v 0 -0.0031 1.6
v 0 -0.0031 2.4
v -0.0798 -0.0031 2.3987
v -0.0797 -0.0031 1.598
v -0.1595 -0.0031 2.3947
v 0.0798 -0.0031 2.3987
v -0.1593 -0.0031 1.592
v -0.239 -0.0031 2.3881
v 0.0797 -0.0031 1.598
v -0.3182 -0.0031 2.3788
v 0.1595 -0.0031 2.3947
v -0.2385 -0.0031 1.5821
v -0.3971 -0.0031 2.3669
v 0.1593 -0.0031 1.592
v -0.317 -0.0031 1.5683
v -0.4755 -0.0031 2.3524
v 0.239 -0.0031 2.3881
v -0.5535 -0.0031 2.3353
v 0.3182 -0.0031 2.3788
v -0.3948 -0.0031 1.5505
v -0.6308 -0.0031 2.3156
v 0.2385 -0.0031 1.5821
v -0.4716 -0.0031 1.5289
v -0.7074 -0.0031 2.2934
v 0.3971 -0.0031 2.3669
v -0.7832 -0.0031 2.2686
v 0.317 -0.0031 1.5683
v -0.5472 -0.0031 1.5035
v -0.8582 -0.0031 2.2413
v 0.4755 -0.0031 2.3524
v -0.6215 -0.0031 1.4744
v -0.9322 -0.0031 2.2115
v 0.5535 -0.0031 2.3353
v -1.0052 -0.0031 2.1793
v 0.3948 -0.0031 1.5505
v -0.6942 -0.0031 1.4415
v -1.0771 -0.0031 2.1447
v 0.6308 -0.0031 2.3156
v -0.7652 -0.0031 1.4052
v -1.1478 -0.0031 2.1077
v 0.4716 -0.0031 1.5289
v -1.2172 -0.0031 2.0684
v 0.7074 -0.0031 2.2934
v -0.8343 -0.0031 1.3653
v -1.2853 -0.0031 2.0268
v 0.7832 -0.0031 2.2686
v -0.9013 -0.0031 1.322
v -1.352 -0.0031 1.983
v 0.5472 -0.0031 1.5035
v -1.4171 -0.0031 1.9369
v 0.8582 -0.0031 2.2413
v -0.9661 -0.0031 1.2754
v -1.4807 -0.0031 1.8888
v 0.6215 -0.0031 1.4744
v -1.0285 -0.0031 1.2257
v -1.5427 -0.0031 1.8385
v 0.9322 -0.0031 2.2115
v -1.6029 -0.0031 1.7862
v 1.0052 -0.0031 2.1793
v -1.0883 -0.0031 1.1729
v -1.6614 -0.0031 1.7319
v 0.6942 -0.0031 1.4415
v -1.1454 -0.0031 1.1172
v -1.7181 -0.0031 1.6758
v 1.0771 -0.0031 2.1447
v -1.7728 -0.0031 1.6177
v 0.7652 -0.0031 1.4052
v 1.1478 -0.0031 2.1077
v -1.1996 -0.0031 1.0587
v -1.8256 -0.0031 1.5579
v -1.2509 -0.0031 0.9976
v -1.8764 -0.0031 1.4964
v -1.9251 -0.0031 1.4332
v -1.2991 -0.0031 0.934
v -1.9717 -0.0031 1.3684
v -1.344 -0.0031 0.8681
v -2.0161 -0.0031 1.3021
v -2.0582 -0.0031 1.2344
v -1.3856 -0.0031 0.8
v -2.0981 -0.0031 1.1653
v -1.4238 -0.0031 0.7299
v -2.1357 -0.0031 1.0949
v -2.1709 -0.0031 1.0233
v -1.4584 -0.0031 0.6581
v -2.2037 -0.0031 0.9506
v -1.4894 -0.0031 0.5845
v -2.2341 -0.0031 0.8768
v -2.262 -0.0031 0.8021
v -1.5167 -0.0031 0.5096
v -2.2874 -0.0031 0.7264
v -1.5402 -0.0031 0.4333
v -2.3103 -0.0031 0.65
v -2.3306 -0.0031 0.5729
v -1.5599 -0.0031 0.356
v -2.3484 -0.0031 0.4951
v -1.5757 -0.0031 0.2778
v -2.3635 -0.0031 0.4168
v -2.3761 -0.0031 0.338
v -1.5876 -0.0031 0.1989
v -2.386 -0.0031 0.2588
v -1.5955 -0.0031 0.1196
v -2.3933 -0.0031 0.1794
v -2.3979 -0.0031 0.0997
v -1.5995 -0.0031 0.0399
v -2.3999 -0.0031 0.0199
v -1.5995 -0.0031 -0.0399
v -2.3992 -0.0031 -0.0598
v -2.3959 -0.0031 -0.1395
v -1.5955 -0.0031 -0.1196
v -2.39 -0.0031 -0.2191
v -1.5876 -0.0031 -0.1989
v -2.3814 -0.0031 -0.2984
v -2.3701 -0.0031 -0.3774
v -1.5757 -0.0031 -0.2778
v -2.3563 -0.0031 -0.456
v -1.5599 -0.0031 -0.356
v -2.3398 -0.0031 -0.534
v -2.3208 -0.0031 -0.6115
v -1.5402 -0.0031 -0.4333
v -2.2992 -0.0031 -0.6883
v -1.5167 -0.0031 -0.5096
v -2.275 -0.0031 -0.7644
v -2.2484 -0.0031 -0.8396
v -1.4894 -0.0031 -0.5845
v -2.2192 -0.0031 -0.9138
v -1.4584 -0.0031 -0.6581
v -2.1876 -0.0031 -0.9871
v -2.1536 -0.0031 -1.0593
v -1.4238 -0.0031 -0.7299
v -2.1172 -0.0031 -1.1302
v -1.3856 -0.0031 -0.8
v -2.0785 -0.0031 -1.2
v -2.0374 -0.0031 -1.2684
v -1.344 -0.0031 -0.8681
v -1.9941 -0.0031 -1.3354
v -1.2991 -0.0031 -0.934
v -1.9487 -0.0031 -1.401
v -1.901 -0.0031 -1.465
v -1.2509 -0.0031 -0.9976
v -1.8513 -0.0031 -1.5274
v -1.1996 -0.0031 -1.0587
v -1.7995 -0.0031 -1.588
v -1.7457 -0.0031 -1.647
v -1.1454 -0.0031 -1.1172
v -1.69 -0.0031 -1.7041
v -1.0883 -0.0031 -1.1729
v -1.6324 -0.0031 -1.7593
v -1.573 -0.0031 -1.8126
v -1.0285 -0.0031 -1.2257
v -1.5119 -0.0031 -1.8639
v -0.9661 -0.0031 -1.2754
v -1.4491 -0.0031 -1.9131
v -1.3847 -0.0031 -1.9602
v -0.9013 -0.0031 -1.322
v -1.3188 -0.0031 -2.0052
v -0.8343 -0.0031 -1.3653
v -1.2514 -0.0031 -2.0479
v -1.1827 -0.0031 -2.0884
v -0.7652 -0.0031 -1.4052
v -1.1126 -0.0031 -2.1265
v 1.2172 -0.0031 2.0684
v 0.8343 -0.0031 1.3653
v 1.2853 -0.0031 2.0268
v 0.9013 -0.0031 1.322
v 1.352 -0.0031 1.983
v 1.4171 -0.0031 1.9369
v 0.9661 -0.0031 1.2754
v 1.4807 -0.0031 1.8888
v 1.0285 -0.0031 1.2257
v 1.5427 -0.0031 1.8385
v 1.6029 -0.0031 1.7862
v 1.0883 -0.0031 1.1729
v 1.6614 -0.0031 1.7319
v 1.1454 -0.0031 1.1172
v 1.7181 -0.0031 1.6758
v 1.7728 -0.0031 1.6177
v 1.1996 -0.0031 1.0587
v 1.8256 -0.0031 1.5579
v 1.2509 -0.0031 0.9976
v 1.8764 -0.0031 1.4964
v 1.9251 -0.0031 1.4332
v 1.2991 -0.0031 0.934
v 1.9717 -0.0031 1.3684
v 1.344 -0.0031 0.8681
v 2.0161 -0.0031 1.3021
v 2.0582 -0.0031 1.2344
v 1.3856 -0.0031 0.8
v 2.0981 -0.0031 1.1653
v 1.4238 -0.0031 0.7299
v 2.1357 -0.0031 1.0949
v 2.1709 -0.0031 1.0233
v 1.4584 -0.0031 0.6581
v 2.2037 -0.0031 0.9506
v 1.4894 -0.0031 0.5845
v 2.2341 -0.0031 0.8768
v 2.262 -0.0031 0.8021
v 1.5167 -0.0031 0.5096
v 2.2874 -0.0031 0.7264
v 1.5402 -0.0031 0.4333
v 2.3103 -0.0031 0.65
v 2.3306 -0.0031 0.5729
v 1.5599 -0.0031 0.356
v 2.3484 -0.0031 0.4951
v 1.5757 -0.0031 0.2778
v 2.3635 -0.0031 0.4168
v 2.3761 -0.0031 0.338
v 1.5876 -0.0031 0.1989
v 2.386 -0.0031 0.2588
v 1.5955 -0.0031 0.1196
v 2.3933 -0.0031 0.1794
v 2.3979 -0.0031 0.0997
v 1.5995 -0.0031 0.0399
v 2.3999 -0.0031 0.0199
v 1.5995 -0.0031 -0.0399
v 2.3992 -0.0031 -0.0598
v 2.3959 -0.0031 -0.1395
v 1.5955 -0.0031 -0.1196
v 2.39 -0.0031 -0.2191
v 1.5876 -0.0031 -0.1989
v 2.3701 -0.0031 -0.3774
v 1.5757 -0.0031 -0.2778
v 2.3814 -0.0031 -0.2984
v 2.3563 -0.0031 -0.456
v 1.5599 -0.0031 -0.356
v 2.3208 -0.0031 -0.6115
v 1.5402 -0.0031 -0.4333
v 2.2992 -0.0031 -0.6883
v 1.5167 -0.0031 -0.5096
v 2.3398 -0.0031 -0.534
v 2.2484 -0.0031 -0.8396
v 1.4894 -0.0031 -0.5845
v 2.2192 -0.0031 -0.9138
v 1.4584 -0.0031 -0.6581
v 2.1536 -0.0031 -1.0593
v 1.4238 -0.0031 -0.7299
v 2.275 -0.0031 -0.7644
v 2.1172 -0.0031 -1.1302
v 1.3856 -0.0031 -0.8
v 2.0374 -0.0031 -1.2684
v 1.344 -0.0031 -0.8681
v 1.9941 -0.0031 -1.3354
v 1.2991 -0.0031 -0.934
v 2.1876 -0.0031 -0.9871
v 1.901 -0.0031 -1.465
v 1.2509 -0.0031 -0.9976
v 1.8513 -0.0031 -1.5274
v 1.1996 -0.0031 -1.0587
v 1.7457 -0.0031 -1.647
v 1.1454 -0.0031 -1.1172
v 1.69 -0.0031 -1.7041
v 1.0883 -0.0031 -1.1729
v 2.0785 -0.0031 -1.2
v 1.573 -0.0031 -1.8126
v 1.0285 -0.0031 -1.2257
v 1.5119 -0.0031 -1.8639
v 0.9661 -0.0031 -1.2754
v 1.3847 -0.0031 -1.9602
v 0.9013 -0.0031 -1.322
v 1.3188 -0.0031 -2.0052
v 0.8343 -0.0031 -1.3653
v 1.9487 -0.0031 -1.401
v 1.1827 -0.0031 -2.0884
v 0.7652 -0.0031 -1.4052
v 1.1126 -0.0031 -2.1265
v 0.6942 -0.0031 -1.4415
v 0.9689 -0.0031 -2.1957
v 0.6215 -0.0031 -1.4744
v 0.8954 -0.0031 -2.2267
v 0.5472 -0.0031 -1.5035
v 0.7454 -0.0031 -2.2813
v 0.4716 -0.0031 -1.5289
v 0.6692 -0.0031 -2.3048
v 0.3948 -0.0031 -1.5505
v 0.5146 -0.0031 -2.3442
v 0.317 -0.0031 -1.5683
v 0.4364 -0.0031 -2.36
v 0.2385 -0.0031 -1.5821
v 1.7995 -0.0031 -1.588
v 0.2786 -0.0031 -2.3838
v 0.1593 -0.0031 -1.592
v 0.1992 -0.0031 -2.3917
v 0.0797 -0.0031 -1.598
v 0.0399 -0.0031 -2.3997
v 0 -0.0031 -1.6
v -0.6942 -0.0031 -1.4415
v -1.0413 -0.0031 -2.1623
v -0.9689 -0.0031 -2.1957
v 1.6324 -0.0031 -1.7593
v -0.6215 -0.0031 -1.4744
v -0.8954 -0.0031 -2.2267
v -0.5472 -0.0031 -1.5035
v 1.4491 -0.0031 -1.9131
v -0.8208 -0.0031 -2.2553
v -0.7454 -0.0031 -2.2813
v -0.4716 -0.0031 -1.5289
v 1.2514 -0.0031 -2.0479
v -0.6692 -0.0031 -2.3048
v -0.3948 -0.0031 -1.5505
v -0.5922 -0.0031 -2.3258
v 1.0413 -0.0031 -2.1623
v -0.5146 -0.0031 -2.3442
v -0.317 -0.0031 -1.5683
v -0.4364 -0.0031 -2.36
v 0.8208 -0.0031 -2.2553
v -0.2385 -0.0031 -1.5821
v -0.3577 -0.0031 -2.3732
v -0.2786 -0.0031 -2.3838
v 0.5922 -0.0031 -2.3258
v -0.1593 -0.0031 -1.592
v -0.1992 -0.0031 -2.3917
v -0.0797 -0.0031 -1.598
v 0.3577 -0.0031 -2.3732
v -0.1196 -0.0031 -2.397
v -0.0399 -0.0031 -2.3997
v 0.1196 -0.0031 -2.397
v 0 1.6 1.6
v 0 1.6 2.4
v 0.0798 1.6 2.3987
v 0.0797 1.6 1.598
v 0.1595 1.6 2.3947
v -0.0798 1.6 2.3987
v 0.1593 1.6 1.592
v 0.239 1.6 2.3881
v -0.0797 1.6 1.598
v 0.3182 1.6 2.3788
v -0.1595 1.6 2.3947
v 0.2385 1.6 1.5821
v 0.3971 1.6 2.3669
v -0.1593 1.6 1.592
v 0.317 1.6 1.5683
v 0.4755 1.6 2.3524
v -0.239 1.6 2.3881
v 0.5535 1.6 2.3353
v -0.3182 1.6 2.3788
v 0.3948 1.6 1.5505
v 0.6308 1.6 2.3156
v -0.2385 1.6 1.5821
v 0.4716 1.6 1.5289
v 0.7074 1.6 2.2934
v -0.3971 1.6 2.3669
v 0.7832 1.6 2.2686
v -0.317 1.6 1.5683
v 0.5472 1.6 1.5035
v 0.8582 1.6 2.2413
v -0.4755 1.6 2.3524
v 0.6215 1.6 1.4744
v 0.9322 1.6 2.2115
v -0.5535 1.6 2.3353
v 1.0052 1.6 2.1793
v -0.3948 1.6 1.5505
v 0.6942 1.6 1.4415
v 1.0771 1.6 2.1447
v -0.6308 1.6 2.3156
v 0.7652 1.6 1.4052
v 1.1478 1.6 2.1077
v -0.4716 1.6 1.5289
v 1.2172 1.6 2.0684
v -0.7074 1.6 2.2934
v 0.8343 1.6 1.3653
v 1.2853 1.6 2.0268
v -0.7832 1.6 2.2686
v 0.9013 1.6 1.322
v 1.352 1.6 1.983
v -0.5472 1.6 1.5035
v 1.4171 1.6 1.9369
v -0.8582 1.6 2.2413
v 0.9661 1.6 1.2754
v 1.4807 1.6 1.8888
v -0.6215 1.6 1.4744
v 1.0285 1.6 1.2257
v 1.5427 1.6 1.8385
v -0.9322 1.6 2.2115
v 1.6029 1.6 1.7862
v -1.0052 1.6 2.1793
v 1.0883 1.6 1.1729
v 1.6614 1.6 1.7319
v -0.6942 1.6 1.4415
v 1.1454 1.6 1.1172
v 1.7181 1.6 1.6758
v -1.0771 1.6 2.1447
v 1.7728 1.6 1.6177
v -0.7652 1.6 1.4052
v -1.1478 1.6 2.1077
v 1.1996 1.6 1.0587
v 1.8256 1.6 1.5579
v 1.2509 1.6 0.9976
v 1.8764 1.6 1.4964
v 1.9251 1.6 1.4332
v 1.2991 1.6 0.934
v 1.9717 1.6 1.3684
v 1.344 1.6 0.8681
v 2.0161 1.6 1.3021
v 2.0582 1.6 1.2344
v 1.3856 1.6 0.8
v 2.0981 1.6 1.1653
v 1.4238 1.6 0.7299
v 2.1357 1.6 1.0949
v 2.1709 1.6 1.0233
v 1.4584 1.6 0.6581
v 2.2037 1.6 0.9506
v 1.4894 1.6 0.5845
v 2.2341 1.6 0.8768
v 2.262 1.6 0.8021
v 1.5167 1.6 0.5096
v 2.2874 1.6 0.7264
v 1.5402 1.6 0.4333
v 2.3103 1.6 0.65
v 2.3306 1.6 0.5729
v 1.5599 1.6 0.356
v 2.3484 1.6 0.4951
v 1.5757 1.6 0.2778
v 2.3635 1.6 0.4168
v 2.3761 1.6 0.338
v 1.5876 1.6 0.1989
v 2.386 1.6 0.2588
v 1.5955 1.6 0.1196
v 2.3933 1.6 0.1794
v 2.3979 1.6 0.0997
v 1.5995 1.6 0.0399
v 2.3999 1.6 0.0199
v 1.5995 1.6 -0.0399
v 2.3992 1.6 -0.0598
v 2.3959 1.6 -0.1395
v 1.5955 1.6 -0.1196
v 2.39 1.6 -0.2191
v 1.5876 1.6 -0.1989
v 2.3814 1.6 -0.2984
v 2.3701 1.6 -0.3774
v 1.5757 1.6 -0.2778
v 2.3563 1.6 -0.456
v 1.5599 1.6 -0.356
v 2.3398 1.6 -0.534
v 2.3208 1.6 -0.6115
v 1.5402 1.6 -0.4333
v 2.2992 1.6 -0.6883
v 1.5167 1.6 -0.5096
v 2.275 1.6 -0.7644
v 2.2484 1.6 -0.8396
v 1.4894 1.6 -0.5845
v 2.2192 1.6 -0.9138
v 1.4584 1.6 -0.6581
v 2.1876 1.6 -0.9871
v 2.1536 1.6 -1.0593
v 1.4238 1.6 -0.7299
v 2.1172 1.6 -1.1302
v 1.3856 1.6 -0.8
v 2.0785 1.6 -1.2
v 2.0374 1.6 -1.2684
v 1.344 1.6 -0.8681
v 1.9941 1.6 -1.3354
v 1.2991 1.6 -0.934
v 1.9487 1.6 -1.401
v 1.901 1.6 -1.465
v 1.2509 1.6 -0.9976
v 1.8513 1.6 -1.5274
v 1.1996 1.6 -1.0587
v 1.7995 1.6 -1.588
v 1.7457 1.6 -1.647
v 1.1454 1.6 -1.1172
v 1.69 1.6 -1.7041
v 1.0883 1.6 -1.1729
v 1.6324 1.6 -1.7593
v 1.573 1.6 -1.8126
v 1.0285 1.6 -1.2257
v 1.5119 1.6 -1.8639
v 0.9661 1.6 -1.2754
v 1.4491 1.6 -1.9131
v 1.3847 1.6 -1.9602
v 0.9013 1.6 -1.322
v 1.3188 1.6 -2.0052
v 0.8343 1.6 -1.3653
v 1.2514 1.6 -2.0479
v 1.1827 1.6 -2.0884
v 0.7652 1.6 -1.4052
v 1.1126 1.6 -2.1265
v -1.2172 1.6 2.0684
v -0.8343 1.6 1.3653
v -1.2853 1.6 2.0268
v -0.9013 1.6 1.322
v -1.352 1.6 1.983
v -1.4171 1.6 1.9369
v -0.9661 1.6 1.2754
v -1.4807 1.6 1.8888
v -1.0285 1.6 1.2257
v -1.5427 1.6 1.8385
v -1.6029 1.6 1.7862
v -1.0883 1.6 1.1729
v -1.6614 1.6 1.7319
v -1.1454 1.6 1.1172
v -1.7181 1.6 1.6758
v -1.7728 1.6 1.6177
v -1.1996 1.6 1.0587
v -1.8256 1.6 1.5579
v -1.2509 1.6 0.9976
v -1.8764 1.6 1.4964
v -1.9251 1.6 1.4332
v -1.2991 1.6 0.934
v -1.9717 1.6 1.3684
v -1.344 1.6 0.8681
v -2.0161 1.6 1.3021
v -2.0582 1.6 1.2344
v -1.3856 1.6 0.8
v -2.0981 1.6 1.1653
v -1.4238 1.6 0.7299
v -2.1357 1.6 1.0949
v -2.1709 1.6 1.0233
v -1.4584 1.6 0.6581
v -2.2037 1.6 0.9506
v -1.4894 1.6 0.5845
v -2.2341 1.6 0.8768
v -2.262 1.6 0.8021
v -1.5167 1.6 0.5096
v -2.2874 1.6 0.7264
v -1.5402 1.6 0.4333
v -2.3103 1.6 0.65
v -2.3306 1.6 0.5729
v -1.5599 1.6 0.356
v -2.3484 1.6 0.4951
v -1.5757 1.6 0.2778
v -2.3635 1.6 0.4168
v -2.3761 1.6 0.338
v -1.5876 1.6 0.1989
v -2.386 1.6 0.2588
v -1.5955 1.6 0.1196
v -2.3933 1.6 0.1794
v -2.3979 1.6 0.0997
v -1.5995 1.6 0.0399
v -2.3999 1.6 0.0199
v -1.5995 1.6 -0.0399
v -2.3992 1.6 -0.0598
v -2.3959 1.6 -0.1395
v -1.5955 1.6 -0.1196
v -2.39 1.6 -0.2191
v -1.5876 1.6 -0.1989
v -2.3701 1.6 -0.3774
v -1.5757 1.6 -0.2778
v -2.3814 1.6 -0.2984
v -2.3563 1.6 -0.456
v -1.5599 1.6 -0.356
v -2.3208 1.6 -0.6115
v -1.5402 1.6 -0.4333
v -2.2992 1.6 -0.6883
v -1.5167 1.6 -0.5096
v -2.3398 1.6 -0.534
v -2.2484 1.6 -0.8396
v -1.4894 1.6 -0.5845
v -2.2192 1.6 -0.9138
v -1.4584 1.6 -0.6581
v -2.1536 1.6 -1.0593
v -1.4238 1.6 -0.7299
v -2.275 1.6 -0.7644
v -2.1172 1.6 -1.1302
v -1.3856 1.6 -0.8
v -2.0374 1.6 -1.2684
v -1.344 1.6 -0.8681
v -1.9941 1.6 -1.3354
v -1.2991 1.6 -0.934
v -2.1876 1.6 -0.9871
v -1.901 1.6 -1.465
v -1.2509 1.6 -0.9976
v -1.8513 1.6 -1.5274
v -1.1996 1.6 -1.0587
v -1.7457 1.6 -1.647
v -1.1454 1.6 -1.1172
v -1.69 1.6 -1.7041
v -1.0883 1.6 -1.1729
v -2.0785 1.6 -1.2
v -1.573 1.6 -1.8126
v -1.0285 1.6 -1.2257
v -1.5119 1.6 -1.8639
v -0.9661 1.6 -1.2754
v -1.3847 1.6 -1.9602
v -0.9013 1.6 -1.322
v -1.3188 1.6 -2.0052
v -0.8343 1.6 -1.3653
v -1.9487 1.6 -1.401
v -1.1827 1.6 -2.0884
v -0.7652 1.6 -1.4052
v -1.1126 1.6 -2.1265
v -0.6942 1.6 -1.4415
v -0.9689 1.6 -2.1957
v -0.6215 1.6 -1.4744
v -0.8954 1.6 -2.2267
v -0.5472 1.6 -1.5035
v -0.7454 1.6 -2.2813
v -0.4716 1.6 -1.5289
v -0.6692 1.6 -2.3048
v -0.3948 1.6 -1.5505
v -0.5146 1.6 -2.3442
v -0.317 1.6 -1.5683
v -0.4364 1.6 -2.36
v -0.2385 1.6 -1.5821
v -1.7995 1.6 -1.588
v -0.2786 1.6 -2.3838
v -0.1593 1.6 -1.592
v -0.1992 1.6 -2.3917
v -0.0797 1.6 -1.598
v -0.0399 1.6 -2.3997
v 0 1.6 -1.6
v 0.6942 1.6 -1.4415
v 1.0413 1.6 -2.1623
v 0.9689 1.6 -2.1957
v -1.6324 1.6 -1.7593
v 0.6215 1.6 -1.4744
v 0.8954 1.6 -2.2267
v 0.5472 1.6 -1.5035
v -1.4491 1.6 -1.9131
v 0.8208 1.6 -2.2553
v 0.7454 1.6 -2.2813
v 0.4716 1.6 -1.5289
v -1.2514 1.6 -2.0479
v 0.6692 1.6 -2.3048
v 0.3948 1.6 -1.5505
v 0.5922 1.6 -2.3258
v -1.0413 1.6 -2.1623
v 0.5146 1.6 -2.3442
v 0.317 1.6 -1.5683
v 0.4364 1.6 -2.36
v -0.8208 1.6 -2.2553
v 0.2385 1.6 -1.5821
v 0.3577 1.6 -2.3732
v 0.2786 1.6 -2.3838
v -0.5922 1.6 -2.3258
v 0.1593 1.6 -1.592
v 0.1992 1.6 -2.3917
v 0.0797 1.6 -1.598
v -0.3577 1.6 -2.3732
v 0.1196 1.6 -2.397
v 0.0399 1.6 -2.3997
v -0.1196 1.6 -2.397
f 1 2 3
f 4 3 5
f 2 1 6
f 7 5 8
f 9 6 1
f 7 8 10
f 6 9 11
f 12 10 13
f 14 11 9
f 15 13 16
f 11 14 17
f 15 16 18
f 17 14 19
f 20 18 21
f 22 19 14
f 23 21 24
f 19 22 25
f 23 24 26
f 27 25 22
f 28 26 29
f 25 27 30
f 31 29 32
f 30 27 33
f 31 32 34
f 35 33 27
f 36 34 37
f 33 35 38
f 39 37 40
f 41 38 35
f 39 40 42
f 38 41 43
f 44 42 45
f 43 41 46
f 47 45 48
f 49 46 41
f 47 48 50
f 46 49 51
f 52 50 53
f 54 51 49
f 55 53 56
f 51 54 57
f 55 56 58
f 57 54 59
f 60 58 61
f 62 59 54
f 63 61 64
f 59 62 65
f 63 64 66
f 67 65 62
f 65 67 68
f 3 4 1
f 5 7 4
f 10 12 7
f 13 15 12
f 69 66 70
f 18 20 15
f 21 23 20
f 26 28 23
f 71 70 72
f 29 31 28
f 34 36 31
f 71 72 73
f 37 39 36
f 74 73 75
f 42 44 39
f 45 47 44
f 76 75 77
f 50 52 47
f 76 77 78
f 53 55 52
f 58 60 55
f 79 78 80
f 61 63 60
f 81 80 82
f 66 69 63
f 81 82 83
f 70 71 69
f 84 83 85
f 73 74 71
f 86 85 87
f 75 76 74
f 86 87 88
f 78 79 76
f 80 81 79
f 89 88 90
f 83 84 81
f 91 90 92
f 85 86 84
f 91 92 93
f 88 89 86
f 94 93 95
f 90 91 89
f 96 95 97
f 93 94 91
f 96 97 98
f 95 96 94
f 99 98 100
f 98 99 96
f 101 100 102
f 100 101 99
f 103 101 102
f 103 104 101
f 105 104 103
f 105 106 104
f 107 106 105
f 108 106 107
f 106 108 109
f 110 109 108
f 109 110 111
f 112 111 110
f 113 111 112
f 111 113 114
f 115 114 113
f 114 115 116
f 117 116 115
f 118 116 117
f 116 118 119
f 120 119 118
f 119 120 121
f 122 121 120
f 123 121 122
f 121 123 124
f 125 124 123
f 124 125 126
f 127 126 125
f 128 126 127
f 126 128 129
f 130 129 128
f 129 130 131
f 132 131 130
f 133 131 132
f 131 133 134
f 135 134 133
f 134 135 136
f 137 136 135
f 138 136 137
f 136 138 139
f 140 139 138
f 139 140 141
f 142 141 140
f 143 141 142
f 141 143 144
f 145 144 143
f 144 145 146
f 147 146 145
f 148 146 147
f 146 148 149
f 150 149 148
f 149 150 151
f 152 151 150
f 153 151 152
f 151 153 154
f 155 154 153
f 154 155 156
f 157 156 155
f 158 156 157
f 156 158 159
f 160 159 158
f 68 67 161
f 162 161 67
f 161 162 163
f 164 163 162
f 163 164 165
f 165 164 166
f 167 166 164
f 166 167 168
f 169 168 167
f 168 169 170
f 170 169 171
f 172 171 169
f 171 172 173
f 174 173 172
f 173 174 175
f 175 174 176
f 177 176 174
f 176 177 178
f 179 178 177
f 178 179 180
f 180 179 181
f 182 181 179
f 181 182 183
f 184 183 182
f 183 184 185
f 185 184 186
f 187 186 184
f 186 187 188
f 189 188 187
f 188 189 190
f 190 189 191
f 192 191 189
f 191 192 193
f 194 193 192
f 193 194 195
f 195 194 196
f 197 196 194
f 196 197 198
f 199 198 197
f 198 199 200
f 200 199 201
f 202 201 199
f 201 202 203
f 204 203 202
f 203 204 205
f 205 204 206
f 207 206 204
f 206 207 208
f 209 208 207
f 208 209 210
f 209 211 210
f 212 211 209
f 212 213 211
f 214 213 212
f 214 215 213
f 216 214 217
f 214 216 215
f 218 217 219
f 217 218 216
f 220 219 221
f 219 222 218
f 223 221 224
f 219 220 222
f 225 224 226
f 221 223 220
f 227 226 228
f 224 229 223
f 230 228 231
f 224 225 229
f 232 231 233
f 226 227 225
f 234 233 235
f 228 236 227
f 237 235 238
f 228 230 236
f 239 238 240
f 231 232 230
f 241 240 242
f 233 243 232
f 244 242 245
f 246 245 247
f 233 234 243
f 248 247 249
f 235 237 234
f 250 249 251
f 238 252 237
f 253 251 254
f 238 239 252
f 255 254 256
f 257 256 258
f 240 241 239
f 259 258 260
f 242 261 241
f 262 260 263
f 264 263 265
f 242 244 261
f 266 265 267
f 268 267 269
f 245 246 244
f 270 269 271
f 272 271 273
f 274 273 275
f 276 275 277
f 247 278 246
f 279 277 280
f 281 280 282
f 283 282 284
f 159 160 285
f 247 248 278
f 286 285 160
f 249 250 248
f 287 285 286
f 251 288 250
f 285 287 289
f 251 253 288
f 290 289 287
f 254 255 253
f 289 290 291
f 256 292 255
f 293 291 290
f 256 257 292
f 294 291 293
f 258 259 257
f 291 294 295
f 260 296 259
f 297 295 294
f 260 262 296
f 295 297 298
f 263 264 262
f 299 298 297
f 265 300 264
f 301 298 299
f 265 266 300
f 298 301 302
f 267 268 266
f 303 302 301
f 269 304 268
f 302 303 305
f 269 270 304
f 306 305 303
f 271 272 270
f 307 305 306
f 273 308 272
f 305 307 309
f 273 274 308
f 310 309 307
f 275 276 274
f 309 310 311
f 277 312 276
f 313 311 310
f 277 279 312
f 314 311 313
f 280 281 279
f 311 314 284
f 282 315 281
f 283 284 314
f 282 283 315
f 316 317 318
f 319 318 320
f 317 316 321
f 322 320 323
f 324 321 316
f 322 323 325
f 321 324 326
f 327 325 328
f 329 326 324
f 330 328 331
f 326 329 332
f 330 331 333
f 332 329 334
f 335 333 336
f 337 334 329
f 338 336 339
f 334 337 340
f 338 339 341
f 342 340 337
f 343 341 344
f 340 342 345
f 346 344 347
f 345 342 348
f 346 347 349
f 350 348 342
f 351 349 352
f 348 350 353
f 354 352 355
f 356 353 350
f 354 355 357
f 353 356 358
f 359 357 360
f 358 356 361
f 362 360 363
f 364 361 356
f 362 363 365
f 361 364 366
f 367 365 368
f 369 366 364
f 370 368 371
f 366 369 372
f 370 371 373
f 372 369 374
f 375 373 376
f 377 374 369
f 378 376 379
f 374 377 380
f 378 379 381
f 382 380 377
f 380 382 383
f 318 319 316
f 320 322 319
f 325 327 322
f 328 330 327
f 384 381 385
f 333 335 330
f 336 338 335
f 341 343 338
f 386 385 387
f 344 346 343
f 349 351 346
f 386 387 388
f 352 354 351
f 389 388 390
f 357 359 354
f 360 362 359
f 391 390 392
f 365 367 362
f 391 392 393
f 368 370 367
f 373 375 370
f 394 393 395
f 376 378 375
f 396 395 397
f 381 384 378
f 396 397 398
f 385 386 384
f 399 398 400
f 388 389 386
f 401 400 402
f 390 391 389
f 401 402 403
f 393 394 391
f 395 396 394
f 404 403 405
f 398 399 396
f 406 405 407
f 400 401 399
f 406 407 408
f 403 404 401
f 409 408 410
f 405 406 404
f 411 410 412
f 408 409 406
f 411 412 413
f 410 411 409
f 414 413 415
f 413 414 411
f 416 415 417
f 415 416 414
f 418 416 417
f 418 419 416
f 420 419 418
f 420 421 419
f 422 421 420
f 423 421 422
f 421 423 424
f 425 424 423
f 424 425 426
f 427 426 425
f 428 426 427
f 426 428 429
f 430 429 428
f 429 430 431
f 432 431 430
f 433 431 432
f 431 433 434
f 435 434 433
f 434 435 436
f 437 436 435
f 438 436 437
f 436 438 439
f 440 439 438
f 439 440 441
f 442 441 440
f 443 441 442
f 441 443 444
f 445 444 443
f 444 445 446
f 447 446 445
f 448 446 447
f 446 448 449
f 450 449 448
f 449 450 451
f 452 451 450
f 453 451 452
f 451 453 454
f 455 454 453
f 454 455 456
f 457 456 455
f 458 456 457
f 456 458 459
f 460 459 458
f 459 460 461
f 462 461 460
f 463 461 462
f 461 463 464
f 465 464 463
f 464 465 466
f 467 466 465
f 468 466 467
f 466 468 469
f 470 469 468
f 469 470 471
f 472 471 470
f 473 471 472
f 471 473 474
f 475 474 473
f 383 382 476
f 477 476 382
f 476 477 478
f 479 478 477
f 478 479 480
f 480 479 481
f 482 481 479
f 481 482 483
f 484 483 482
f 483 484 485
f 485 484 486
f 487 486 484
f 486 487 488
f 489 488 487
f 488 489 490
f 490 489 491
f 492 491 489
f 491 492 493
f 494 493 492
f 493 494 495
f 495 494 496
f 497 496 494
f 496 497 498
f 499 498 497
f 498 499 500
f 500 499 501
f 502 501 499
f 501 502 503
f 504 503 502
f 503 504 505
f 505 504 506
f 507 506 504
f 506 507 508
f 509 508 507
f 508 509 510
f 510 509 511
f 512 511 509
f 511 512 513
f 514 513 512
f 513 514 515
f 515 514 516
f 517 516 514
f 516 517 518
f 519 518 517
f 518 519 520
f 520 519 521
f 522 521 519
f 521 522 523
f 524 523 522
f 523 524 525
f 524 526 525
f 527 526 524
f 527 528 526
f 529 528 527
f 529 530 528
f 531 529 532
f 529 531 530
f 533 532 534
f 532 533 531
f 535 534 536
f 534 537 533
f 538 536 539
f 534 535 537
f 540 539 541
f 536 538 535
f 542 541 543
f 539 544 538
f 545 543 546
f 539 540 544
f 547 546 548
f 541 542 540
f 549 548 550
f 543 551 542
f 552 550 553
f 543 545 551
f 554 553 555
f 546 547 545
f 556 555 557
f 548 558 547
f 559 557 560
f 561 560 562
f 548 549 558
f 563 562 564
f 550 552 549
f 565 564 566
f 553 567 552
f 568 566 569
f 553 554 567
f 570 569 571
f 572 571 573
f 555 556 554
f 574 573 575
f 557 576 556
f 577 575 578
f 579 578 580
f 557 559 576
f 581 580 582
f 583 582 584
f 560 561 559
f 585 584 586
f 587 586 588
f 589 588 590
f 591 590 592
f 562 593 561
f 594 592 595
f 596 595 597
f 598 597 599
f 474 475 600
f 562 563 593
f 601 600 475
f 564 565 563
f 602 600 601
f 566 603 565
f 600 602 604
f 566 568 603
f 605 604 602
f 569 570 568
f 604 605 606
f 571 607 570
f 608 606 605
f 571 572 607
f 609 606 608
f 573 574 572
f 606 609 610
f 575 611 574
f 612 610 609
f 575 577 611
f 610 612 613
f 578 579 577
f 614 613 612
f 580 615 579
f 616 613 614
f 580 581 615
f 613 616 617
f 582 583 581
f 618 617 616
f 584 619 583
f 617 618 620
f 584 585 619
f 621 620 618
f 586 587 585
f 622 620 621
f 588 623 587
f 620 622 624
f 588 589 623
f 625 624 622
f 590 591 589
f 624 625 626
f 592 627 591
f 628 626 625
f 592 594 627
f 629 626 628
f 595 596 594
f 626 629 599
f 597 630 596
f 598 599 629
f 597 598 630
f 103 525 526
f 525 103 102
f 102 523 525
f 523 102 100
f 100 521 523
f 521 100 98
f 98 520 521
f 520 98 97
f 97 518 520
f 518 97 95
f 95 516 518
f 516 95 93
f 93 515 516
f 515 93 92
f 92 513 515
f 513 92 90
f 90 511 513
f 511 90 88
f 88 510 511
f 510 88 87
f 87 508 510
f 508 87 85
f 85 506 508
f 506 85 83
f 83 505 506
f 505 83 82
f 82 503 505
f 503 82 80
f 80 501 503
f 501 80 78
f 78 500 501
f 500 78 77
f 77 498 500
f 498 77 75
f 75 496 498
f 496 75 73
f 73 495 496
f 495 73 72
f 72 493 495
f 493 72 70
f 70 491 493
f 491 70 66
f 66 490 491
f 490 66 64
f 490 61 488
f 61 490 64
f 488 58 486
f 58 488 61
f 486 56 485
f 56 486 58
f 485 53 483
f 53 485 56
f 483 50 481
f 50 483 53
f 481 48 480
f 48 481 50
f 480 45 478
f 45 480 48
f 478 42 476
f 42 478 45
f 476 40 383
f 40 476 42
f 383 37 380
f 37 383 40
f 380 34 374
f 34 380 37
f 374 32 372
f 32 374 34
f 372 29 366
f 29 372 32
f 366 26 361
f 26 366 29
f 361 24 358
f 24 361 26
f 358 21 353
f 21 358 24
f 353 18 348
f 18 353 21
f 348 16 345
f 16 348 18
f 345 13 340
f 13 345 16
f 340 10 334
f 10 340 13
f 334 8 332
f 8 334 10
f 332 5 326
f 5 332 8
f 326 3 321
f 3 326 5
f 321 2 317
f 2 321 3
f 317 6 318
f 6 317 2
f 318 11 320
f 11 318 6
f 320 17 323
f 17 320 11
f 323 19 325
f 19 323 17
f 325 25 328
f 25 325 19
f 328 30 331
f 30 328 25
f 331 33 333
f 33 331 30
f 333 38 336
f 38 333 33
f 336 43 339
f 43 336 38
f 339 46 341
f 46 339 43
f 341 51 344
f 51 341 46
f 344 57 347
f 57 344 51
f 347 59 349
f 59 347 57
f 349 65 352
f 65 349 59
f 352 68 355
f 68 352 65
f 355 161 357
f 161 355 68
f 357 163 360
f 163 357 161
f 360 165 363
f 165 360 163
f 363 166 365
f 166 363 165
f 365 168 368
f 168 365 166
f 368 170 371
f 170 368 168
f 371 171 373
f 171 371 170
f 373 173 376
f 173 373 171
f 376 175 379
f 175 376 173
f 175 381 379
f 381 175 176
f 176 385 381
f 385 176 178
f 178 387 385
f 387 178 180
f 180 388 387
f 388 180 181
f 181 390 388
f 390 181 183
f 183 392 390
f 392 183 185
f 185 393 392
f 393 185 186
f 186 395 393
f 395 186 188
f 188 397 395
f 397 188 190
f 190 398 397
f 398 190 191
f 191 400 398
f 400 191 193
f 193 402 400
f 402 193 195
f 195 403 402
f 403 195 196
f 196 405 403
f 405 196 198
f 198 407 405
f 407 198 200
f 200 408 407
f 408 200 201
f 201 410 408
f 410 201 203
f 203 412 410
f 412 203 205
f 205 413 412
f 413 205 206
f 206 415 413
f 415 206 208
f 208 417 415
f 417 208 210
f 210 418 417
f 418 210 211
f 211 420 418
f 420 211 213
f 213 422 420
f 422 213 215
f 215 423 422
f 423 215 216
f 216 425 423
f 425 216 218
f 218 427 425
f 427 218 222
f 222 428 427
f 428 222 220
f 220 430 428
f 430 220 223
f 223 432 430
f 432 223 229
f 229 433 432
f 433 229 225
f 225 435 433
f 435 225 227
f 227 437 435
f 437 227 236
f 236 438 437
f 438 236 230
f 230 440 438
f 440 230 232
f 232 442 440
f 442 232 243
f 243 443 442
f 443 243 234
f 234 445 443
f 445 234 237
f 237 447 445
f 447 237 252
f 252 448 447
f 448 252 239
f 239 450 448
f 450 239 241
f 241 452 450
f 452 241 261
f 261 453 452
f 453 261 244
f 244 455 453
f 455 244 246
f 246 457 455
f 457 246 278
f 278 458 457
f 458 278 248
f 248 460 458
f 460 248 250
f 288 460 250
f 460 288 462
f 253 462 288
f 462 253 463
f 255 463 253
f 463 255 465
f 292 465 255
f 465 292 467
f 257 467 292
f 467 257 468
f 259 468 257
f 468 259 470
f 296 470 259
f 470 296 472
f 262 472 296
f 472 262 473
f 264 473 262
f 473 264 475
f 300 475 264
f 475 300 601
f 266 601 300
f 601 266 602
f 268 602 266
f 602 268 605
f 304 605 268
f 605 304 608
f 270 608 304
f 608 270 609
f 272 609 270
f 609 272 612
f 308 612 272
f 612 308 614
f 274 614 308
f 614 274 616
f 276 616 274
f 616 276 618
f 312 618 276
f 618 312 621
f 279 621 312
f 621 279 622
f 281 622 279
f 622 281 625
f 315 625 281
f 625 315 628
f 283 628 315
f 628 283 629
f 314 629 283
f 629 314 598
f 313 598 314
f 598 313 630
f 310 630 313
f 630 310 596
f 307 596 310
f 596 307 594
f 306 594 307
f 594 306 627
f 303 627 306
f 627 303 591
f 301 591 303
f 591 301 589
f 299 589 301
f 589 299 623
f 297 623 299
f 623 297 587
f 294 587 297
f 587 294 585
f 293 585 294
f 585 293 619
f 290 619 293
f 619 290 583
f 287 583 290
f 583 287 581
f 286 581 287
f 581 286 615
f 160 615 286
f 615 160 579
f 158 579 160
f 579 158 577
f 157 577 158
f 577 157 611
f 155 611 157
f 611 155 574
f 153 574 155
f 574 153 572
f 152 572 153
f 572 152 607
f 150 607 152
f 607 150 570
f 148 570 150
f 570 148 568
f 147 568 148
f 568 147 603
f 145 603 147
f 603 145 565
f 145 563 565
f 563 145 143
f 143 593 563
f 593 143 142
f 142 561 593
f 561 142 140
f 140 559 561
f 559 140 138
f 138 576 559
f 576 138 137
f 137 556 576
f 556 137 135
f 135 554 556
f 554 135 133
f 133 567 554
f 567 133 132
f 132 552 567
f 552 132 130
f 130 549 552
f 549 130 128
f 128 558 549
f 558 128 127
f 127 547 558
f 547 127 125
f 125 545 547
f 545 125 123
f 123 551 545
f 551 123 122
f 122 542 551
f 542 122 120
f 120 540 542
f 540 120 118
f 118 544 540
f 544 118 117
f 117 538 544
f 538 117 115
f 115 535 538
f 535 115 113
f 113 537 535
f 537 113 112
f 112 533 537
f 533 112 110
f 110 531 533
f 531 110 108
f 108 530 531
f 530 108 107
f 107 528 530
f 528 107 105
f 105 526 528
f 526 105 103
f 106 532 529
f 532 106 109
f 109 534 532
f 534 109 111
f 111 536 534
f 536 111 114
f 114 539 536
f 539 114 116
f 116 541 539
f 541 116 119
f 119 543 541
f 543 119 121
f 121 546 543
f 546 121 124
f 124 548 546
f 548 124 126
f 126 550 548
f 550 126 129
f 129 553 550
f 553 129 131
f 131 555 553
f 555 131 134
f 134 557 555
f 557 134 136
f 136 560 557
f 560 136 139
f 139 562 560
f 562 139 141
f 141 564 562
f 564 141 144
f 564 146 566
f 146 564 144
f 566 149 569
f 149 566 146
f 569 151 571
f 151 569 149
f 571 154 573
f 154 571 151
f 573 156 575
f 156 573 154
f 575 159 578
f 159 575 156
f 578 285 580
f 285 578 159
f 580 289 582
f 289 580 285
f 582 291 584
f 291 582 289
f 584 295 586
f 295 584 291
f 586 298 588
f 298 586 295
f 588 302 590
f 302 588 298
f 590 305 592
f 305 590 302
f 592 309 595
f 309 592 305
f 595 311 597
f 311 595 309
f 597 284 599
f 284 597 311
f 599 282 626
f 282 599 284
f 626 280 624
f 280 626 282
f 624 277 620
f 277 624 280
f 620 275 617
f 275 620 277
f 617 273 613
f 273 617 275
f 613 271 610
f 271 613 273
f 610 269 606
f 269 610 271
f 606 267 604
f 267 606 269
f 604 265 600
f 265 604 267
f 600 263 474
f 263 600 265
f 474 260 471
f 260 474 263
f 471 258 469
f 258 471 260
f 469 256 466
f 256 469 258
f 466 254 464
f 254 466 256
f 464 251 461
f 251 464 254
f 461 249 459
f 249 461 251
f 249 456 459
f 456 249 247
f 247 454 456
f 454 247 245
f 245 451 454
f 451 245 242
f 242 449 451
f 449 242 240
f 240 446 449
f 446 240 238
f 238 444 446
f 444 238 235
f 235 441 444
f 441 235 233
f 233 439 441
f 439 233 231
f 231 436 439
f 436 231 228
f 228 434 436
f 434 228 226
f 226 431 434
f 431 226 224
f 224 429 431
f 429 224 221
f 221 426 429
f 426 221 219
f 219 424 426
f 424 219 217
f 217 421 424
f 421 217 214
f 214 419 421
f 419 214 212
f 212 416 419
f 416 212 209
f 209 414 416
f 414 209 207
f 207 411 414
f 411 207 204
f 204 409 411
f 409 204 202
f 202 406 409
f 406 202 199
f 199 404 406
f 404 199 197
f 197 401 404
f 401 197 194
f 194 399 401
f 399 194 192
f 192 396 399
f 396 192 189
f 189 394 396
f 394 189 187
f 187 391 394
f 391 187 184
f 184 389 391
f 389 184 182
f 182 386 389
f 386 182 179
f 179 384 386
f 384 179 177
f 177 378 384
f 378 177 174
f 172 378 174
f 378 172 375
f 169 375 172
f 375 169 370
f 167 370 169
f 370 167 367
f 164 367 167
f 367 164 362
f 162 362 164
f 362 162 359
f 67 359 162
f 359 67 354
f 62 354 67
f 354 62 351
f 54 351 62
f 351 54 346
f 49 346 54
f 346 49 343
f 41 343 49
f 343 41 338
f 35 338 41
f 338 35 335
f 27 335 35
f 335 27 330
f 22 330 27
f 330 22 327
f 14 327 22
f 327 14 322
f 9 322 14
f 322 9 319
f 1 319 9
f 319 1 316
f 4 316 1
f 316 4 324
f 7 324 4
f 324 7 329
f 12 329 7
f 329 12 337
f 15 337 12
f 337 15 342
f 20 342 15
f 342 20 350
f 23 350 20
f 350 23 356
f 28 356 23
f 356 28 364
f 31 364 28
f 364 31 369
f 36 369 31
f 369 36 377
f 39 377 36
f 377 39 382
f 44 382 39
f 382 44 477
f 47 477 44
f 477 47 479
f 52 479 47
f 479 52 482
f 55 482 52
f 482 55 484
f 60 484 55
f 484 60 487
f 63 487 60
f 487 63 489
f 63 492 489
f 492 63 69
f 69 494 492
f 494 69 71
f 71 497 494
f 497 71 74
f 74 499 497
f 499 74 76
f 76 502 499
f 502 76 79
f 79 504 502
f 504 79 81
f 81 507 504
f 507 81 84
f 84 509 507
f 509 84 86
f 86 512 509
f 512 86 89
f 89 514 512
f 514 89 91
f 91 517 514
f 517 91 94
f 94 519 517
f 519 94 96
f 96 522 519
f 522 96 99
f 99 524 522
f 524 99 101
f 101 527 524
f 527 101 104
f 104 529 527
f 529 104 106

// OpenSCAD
use <../lib.scad>
use <25375k01.scad>
use <25375k02.scad>
$fa=1; $fs=0.2;
function ldraw_lib__25375_f2(realsolid=false) = [
// 0 Tassel Hanging from Side
// 0 Name: 25375-f2.dat
// 0 Author: Philippe Hurbain [Philo]
// 0 !LDRAW_ORG Part UPDATE 2022-04
// 0 !LICENSE Licensed under CC BY 2.0 and CC BY 4.0 : see CAreadme.txt
// 
// 0 BFC CERTIFY CCW
  [0,"BFC","CERTIFY"],
  [0,"BFC","CCW"],
// 
// 0 !CATEGORY Minifig Accessory
// 
// 0 !HISTORY 2016-10-05 {LEGO Digital Designer} Original part shape
// 0 !HISTORY 2016-10-10 [Philo] File preparation for LDraw Parts Tracker
// 0 !HISTORY 2022-07-18 [PTadmin] Official Update 2022-04
// 
// 
// 1 16 0 0 0 1 0 0 0 0 1 0 -1 0 25375k01.dat
  [1,16,0,0,0,1,0,0,0,0,1,0,-1,0, ldraw_lib__25375k01(realsolid)],
// 1 16 0 -1.8 -16.35 1 0 0 0 1 0 0 0 1 25375k02.dat
  [1,16,0,-1.8,-16.35,1,0,0,0,1,0,0,0,1, ldraw_lib__25375k02(realsolid)],
];
module ldraw_lib__25375_f2(step=0, col=false, unit=2/5, alt=false, line=0.2, solid=!$preview)
    makepoly(ldraw_lib__25375_f2(solid), step=step, col=col, unit=unit, alt=alt, line=line, solid=solid);
ldraw_lib__25375_f2(line=0.2);
